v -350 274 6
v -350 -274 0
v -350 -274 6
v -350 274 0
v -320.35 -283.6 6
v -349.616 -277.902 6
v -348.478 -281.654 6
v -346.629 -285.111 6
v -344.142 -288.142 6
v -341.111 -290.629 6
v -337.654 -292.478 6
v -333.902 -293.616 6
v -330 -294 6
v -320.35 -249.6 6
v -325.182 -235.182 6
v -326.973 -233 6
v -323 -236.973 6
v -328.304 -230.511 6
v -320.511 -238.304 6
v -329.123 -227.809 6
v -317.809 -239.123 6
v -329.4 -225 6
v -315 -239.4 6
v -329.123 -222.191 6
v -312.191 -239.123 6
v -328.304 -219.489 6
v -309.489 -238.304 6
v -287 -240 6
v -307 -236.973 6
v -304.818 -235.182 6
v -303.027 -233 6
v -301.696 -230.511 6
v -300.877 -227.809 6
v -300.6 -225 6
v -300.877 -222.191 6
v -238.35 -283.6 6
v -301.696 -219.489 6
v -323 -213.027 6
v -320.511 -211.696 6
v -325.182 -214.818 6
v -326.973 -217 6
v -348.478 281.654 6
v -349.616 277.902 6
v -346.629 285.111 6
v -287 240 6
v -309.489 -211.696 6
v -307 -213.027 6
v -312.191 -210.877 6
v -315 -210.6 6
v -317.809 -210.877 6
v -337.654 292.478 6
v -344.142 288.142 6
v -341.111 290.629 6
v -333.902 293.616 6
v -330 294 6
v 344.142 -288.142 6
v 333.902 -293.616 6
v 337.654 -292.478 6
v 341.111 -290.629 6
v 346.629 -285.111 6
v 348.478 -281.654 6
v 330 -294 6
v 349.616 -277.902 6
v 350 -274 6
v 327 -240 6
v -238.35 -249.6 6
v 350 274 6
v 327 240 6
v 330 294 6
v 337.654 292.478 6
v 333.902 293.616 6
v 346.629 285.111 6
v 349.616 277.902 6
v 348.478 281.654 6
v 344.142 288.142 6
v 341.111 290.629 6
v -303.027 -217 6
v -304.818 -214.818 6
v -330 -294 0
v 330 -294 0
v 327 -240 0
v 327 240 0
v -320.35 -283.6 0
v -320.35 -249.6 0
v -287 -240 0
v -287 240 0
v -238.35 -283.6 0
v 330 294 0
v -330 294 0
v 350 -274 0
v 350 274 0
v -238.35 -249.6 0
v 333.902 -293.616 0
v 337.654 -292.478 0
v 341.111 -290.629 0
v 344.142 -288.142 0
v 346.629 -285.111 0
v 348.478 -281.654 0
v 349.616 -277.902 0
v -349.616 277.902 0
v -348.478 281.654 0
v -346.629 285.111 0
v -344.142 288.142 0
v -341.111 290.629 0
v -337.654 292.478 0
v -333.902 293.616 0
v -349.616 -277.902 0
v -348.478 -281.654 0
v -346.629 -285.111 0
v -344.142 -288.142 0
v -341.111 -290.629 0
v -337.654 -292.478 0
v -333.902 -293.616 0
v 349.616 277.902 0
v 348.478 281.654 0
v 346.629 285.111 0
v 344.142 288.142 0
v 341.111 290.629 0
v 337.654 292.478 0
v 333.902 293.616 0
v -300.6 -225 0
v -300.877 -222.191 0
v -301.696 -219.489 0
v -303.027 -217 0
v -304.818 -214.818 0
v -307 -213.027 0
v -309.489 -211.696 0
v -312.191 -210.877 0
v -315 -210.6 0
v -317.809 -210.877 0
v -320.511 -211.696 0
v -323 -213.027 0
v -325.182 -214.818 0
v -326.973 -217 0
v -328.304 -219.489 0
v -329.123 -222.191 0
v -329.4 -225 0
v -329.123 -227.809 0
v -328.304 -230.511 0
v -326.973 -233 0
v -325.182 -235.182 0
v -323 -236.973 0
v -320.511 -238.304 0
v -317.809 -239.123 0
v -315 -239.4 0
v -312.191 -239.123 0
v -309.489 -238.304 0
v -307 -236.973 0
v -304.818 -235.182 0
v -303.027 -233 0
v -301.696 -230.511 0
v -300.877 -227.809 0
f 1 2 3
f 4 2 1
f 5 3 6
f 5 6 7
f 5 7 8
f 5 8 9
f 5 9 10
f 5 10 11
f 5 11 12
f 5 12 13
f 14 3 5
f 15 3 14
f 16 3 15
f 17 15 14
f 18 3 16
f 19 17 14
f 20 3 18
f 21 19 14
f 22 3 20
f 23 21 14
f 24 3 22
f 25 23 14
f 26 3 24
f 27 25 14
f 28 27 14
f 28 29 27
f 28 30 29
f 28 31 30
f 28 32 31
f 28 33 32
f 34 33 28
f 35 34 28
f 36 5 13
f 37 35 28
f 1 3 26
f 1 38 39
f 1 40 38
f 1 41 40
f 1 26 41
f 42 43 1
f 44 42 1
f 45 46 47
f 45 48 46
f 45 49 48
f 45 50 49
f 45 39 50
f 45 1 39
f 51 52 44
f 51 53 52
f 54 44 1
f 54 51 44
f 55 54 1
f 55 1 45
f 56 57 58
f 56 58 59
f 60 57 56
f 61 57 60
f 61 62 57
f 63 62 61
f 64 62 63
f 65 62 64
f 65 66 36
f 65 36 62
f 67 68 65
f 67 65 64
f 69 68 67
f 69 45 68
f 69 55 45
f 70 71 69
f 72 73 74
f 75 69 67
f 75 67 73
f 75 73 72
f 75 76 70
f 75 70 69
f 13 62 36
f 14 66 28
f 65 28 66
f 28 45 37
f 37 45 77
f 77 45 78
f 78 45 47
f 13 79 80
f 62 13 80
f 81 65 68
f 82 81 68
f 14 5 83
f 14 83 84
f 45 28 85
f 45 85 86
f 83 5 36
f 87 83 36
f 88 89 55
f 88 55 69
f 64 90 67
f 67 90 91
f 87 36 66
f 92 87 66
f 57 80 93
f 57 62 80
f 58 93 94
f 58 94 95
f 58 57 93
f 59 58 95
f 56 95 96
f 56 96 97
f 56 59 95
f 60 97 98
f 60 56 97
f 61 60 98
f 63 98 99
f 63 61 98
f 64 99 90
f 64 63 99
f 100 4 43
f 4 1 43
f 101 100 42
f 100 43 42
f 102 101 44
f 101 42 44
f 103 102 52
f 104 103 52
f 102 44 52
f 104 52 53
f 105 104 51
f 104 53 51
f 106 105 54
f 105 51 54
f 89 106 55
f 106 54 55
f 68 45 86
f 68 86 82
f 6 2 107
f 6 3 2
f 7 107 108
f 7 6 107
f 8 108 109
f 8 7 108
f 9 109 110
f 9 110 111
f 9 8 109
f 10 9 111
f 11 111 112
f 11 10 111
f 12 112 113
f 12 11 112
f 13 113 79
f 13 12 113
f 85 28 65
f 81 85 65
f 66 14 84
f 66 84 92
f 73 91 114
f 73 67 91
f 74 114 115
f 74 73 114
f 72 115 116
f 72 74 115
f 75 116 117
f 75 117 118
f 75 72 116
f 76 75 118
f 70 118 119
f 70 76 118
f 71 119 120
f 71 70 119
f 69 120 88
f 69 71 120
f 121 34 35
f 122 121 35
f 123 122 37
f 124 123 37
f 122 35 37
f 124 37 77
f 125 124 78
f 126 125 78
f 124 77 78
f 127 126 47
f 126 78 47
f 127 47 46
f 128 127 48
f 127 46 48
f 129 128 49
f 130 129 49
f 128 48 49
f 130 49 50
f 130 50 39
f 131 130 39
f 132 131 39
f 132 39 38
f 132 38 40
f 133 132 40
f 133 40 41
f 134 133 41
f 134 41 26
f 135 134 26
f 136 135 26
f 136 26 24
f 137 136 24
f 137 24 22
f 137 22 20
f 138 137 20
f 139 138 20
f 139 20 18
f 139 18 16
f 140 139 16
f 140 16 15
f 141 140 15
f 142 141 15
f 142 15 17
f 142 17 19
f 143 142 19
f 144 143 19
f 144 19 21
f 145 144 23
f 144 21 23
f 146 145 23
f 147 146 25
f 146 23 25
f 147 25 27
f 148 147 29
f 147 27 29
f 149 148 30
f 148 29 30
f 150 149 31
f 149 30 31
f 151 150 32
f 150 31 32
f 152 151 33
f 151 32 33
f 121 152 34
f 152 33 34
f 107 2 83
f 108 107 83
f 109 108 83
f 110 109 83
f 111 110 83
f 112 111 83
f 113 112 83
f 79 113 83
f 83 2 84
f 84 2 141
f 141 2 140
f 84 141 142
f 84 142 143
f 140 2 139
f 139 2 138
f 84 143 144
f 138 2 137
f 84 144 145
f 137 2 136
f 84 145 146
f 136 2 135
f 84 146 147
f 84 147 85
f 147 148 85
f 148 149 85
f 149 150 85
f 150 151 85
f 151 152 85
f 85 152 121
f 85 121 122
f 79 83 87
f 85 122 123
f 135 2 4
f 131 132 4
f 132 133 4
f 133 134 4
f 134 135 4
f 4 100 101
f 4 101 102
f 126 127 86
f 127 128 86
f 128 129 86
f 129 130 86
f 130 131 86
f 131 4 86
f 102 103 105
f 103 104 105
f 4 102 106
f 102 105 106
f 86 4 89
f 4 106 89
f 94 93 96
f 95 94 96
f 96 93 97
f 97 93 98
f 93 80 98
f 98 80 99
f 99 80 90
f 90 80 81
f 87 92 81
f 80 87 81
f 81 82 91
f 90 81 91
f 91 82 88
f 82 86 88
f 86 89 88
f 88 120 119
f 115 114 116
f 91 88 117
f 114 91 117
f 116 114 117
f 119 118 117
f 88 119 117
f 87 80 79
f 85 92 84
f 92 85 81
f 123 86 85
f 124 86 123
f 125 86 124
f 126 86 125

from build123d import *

# Parameters (mm, degrees)
SKETCH1_W           = 700
SKETCH1_H           = 588
BOSS_EXTRUDE1_DEPTH = 6
FILLET1_R           = 20
SKETCH2_R           = 14.4
SKETCH2_W           = 614
SKETCH2_H           = 480
SKETCH2_W_2         = 82
SKETCH2_H_2         = 34
CUT_EXTRUDE1_DEPTH  = 84


with BuildPart() as part:
    # Sketch1 → Boss-Extrude1 (new body)
    with BuildSketch(Plane.XY):
        Rectangle(SKETCH1_W, SKETCH1_H)
    extrude(amount=BOSS_EXTRUDE1_DEPTH)

    # Fillet1
    fillet1_edges = [part.edges().sort_by_distance(p)[0] for p in [
        (350, -294, 3),
        (-350, -294, 3),
        (-350, 294, 3),
        (350, 294, 3),
    ]]
    fillet(fillet1_edges, radius=FILLET1_R)

    # Sketch2 → Cut-Extrude1 (cut)
    with BuildSketch(Plane.XY.offset(6)):
        with Locations((-315, -225)):
            Circle(SKETCH2_R)
        with Locations((20, 0)):
            Rectangle(SKETCH2_W, SKETCH2_H)
        with Locations((-279.35, -266.6)):
            Rectangle(SKETCH2_W_2, SKETCH2_H_2)
    extrude(amount=-CUT_EXTRUDE1_DEPTH, mode=Mode.SUBTRACT)


solid = part.part
